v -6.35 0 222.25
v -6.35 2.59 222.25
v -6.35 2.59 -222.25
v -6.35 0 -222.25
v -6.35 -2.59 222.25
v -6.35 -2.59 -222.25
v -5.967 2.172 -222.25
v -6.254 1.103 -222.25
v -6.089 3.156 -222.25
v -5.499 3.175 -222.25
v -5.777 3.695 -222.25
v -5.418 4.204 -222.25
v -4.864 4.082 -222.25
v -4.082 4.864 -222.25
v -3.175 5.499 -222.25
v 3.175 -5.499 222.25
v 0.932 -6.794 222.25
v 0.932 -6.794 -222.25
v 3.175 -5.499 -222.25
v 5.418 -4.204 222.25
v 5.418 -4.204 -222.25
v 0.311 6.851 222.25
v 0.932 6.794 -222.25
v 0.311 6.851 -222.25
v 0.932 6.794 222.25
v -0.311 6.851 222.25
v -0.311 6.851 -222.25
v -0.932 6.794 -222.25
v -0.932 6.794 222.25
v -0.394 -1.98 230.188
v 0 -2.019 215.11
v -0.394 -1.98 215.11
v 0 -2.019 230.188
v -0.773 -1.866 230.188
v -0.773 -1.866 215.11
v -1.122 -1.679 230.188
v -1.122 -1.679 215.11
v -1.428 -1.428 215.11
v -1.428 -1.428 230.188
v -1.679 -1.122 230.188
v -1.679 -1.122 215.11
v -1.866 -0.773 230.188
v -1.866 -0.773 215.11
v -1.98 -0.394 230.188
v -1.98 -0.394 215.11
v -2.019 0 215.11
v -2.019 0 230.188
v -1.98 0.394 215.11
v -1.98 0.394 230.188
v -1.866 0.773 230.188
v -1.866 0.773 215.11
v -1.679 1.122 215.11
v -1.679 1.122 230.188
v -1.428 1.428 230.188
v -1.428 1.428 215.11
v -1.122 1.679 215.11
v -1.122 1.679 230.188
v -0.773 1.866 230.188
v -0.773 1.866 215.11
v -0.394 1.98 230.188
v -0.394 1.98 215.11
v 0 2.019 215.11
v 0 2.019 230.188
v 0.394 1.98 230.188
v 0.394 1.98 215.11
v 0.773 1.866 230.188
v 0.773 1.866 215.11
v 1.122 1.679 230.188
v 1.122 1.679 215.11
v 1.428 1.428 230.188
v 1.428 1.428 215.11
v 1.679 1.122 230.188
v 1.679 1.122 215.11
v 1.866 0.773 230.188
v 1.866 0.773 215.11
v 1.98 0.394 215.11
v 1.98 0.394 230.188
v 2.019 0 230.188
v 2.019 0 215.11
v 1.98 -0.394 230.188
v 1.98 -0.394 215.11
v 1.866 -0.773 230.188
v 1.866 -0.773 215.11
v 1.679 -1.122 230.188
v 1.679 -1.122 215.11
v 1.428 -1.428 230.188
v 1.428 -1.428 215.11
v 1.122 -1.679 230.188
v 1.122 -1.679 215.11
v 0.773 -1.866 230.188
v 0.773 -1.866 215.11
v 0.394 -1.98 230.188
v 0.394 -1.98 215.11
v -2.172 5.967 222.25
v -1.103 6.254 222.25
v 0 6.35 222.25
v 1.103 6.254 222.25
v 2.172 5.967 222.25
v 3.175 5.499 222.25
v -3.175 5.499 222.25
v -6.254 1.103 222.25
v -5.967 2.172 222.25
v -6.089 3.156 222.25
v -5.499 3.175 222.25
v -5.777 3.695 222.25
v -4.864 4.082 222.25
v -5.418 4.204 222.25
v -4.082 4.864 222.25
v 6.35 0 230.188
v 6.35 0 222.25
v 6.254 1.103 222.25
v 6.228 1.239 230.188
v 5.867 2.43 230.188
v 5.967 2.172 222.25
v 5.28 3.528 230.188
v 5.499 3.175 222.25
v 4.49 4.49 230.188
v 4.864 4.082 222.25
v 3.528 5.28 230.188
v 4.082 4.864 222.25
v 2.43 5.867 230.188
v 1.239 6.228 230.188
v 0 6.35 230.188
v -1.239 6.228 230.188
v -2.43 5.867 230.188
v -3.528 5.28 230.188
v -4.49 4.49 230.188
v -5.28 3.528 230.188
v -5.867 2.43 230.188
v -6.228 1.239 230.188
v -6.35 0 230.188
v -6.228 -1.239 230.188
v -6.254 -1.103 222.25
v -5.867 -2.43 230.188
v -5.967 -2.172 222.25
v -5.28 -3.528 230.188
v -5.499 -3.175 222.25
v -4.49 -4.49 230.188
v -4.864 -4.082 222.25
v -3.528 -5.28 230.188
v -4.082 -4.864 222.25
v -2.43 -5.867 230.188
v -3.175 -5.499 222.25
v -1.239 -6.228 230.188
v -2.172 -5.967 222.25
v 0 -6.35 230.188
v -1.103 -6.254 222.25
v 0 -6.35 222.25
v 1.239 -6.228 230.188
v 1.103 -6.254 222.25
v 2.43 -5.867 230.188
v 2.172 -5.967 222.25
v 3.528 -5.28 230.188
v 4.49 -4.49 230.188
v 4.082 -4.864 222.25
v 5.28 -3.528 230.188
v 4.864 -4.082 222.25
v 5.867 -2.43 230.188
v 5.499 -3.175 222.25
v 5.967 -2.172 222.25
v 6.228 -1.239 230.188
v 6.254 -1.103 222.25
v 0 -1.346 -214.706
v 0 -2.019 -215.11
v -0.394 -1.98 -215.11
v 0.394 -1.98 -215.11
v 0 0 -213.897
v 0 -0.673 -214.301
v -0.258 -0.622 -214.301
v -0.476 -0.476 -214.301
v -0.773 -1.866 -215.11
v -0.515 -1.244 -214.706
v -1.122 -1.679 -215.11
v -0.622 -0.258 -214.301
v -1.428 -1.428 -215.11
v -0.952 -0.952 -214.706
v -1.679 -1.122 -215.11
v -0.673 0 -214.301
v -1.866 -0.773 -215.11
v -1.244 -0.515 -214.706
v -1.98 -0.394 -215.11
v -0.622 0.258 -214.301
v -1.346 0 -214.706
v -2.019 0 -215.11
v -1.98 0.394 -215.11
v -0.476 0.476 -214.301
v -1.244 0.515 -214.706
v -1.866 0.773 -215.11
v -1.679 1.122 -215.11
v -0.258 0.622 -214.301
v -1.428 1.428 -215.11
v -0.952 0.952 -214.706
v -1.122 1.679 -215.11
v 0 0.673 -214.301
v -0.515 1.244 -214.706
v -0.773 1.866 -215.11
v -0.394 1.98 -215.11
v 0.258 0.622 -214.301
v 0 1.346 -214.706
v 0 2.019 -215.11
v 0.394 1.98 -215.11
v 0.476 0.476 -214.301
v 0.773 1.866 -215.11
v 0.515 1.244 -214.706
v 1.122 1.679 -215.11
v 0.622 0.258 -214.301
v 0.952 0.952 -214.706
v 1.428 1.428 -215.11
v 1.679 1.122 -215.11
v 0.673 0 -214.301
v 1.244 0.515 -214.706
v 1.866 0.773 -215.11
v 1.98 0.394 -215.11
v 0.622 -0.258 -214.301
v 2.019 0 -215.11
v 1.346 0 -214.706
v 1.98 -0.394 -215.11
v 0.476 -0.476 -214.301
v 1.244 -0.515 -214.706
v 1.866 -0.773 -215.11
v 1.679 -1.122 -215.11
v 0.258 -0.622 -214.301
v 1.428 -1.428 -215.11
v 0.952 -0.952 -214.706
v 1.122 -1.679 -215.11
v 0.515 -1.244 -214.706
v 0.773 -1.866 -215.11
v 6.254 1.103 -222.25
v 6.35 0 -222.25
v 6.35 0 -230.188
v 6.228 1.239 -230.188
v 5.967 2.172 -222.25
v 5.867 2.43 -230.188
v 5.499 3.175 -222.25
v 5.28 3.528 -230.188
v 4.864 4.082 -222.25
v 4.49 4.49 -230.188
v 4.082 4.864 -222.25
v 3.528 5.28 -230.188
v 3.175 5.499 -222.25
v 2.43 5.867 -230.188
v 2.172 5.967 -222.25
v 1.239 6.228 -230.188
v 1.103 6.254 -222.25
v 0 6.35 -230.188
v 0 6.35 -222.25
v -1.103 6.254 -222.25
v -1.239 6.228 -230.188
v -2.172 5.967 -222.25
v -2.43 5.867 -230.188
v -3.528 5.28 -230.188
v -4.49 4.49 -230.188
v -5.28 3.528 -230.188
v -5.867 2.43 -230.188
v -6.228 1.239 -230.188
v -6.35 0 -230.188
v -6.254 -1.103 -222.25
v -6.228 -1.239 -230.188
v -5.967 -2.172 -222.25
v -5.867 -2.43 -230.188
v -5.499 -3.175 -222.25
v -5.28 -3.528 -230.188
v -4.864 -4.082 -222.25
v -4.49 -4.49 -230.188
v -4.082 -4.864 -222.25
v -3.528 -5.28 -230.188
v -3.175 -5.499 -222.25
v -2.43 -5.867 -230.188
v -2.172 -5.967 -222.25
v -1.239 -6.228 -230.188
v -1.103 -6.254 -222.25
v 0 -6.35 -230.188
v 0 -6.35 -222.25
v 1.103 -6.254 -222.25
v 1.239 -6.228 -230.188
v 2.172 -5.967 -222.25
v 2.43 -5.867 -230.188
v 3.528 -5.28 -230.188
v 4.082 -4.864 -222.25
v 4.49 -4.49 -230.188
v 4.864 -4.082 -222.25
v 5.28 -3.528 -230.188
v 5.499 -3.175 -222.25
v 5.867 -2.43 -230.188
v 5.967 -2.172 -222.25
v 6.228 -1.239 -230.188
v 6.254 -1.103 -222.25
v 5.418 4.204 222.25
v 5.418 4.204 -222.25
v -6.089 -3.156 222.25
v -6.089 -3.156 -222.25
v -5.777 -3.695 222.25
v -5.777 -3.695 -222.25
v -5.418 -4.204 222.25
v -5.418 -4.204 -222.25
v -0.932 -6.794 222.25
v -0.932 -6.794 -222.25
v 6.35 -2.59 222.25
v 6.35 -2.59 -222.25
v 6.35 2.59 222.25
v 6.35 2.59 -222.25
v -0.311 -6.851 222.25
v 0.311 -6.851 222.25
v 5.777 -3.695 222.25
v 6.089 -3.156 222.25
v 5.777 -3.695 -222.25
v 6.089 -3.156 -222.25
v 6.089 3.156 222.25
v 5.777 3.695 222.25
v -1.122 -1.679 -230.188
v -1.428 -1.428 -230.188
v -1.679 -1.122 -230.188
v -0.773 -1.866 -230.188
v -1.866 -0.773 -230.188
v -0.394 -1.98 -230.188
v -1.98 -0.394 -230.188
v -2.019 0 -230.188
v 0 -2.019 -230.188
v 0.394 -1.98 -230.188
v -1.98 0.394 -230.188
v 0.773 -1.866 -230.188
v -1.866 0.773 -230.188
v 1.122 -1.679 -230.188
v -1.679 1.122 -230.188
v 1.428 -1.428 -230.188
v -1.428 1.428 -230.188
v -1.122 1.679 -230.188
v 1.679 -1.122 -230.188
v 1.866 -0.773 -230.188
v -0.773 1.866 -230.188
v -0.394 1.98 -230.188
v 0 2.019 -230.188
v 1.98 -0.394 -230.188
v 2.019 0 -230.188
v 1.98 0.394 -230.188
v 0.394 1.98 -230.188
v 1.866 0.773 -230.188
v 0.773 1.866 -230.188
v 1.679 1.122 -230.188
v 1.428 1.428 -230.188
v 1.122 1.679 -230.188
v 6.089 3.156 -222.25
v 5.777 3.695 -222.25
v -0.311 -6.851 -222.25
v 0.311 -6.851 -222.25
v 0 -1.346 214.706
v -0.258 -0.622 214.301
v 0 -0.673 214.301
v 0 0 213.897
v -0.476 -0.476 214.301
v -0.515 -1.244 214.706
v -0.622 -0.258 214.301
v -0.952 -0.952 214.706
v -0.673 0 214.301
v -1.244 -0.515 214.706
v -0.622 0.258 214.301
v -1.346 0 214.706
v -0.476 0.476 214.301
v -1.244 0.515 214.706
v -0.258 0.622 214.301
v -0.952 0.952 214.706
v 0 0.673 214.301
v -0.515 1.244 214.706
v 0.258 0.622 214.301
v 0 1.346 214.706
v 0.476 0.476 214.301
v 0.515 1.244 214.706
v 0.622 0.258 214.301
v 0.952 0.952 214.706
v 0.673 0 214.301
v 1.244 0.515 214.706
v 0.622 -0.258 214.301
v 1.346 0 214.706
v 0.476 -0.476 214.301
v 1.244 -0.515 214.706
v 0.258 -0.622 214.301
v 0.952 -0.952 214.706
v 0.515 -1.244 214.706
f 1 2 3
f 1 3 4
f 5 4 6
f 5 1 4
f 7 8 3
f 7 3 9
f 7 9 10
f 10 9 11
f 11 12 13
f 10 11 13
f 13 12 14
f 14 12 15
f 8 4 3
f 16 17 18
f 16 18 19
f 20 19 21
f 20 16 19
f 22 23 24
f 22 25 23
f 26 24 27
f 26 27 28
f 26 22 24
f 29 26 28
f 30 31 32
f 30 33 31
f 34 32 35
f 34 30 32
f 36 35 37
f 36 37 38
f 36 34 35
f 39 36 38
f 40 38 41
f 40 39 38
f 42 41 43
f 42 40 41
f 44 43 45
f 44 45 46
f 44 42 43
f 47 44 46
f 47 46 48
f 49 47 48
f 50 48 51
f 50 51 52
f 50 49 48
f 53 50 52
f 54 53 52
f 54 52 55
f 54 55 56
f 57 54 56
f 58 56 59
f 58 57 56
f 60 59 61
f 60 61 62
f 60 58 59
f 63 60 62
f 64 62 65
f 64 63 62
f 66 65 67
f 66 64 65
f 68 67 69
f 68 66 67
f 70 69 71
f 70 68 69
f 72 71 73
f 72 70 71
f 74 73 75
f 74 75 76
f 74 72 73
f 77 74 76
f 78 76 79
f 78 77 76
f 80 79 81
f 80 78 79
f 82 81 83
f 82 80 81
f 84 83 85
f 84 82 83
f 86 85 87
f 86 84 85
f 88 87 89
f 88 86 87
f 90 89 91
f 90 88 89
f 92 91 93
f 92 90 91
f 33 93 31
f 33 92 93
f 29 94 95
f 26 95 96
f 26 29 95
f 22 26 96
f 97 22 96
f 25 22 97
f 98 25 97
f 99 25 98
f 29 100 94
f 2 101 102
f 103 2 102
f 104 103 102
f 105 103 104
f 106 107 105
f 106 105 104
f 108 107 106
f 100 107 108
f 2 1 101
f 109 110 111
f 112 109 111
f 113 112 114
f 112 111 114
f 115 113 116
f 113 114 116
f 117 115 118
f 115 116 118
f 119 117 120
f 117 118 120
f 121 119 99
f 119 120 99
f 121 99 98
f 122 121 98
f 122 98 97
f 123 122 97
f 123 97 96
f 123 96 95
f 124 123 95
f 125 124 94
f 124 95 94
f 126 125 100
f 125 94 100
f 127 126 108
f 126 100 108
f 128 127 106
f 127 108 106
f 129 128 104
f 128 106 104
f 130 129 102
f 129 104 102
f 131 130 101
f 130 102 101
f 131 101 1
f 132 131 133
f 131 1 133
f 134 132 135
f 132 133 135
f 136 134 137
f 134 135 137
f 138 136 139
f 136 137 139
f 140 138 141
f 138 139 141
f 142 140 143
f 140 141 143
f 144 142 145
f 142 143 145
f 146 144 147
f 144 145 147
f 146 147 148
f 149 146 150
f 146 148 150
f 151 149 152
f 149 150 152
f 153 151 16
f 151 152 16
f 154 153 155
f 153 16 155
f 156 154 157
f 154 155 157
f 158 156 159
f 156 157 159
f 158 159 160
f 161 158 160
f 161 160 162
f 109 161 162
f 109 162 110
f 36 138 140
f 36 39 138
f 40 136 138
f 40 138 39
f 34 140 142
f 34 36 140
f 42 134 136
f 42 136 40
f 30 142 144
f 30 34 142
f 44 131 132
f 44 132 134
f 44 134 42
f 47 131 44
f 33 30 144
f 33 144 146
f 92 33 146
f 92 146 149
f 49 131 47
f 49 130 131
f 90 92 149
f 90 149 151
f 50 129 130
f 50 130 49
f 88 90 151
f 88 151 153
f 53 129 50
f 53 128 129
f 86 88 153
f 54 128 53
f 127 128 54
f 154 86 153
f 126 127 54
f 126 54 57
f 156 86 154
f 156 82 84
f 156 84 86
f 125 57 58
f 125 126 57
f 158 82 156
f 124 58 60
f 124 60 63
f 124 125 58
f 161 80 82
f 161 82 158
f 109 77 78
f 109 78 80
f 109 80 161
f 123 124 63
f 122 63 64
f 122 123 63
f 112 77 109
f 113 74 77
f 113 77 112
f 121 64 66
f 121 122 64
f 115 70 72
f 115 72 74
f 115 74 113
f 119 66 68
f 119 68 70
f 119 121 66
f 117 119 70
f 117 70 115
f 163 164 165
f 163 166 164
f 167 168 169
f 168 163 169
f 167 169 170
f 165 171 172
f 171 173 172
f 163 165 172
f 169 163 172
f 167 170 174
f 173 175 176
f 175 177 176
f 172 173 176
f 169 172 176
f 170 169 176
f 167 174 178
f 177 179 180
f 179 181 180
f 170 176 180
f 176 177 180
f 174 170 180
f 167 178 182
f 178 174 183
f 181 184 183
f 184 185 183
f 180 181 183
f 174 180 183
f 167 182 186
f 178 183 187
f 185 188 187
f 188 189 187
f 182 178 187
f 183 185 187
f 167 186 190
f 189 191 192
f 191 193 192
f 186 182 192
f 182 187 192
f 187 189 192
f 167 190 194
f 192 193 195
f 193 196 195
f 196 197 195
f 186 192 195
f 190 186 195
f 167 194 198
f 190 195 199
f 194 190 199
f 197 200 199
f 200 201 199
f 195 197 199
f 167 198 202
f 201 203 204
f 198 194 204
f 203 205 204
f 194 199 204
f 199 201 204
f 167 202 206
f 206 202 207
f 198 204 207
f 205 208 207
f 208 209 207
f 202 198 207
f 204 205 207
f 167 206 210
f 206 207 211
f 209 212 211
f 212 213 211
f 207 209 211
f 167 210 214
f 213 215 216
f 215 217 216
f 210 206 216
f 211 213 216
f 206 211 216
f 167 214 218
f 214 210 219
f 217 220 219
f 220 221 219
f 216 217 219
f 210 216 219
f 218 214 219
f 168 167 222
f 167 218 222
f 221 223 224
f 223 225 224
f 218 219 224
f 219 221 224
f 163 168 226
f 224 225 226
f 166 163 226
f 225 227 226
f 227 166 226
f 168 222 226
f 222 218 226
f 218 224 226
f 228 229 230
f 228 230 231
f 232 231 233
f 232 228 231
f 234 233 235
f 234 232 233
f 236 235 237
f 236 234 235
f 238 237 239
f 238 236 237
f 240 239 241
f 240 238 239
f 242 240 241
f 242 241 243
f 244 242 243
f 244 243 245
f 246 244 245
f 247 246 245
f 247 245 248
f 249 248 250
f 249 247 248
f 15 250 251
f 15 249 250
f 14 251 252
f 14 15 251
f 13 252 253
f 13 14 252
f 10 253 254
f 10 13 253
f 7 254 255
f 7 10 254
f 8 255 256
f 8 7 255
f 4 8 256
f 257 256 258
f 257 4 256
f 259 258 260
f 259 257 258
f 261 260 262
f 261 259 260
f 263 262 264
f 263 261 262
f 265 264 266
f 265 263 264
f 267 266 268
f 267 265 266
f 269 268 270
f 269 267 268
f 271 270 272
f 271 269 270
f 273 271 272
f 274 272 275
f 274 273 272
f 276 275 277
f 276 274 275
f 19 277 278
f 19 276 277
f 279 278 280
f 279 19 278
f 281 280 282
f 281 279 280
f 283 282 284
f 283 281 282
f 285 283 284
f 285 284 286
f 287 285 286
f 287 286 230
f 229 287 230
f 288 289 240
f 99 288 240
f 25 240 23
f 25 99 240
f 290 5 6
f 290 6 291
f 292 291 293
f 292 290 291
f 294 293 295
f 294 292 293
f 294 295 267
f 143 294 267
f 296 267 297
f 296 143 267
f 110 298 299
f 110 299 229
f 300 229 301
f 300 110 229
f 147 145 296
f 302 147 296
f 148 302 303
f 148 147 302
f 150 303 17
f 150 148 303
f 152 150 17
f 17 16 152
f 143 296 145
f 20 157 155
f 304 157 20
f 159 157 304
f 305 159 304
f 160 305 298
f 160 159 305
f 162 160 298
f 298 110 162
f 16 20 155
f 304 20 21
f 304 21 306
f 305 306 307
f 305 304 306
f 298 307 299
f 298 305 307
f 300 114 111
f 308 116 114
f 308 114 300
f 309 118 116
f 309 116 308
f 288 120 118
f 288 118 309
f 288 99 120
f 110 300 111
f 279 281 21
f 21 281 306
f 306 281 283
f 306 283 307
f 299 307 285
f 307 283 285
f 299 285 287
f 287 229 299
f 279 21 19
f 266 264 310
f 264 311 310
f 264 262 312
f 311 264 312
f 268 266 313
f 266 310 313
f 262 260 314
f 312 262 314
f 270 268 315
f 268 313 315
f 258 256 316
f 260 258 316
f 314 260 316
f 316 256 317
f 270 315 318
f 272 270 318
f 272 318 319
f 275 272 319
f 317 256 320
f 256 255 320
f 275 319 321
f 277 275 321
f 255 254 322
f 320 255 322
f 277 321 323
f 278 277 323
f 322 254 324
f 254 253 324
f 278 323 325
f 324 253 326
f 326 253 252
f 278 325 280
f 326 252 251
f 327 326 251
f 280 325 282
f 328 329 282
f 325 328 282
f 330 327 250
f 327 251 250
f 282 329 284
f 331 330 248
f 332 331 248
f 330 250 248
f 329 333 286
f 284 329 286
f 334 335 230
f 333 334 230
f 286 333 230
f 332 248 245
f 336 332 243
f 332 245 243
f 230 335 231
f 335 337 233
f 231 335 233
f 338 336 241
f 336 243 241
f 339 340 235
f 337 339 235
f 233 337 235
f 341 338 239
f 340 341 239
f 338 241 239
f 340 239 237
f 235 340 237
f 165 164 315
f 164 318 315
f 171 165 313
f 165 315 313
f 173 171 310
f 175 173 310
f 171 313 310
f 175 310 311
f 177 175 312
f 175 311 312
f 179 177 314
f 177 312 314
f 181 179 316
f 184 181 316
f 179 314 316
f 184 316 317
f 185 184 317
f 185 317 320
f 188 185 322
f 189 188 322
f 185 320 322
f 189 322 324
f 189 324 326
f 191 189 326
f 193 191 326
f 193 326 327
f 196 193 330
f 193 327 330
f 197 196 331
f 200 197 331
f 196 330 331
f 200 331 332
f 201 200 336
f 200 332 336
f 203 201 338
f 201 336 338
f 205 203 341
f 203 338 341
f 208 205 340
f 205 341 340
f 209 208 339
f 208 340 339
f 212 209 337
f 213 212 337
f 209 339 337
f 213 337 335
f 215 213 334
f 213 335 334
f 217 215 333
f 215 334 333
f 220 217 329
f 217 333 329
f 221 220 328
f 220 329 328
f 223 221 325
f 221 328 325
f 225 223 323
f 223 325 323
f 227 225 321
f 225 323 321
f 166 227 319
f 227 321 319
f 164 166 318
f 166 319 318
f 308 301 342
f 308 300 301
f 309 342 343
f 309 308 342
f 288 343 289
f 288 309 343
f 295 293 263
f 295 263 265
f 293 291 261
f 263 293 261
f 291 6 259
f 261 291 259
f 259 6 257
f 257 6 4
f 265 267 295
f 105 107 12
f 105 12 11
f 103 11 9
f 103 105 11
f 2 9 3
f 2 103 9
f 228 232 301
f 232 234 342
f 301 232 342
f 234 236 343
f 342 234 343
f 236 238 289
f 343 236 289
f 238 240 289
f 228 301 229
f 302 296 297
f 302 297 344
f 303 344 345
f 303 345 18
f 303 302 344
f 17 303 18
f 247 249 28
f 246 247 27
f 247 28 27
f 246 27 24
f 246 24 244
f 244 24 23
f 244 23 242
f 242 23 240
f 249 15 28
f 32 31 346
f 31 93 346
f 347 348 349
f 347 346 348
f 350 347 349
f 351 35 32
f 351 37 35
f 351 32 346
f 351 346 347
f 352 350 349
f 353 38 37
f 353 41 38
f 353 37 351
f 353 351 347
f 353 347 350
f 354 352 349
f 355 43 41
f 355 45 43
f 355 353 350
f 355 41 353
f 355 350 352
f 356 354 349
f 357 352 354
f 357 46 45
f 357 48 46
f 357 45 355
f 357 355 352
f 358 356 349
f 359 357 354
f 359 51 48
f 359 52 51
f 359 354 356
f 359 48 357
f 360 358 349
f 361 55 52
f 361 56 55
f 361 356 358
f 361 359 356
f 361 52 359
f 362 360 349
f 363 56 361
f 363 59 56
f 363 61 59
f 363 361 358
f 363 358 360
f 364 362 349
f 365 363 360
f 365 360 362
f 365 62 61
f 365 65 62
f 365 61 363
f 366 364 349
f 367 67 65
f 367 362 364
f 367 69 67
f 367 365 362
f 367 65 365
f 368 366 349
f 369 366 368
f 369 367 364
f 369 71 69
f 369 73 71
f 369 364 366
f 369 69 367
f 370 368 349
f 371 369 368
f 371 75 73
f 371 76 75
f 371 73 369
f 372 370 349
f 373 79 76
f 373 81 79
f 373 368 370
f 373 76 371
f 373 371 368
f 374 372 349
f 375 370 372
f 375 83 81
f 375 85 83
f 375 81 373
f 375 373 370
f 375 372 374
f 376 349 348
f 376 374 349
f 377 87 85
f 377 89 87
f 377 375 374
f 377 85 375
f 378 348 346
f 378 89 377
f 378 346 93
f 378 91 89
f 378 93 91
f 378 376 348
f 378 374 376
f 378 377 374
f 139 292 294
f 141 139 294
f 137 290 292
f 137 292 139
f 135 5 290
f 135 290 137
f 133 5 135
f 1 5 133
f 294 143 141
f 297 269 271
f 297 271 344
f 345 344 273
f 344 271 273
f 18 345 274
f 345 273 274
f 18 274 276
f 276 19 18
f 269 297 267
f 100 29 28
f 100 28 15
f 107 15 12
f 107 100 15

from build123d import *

# Parameters (mm, degrees)
BOSS_EXTRUDE1_DEPTH = 222.25
SKETCH5_R           = 6.35
BOSS_EXTRUDE2_DEPTH = 7.9375


with BuildPart() as part:
    # Sketch1 → Boss-Extrude1 (new, symmetric)
    with BuildSketch(Plane.XY):
        with BuildLine():
            ThreePointArc((0.93173274, 6.79441227), (0, 6.858), (-0.93173274, 6.79441227))
            Line((-0.93173274, 6.79441227), (-5.41826726, 4.204110358))
            ThreePointArc((-5.41826726, 4.204110358), (-5.939202219, 3.429), (-6.35, 2.590301913))
            Line((-6.35, 2.590301913), (-6.35, -2.590301913))
            ThreePointArc((-6.35, -2.590301913), (-5.939202219, -3.429), (-5.41826726, -4.204110358))
            Line((-5.41826726, -4.204110358), (-0.93173274, -6.79441227))
            ThreePointArc((-0.93173274, -6.79441227), (0, -6.858), (0.93173274, -6.79441227))
            Line((0.93173274, -6.79441227), (5.41826726, -4.204110358))
            ThreePointArc((5.41826726, -4.204110358), (5.939202219, -3.429), (6.35, -2.590301913))
            Line((6.35, -2.590301913), (6.35, 2.590301913))
            ThreePointArc((6.35, 2.590301913), (5.939202219, 3.429), (5.41826726, 4.204110358))
            Line((5.41826726, 4.204110358), (0.93173274, 6.79441227))
        make_face()
    extrude(amount=BOSS_EXTRUDE1_DEPTH, both=True)

    # Sketch5 → Boss-Extrude2 (add)
    with BuildSketch(Plane.XY.offset(222.25)):
        Circle(SKETCH5_R)
    boss_extrude2 = extrude(amount=BOSS_EXTRUDE2_DEPTH)

    # Sketch6 → #10-32 Tapped Hole2 (revolve, cut)
    with BuildSketch(Plane(origin=(0, 0, 230.1875), x_dir=(0, -1, 0), z_dir=(1, 0, 0))):
        Polygon((0, 0), (0, 16.290757848), (2.0193, 15.07744), (2.0193, 0), align=None)
    f_10_32_tapped_hole2 = revolve(axis=Axis((0, 0, 236.5375), (0, 0, -1)), mode=Mode.SUBTRACT)

    # Mirror1: Boss-Extrude2, #10-32 Tapped Hole2 across plane
    add(boss_extrude2.mirror(Plane.XY))
    add(f_10_32_tapped_hole2.mirror(Plane.XY), mode=Mode.SUBTRACT)


solid = part.part
